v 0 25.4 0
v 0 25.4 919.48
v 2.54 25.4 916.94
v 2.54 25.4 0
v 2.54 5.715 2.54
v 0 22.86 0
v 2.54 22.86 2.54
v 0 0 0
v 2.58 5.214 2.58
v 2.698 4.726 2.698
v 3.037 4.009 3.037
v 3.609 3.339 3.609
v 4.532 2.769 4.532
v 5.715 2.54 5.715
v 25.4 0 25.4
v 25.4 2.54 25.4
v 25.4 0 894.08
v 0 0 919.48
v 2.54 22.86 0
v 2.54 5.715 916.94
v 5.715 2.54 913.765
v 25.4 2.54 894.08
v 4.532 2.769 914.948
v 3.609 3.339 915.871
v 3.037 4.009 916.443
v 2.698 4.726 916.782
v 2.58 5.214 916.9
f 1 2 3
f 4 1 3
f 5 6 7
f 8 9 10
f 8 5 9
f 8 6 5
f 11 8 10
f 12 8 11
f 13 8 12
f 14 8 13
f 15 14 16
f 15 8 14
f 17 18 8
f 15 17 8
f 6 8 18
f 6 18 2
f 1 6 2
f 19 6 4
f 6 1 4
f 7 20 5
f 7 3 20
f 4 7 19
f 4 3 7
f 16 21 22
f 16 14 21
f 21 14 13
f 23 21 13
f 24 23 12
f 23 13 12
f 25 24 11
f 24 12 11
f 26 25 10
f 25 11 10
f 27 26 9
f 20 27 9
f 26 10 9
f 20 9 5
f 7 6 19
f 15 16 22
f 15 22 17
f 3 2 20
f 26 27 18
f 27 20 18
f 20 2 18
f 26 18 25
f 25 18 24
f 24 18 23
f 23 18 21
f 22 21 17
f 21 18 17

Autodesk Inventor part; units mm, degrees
ref_plane "YZ Plane" through (0, 0, 0) normal (1, 0, 0) x (0, 1, 0)
ref_plane "XZ Plane" through (0, 0, 0) normal (0, 1, 0) x (-1, 0, 0)
ref_plane "XY Plane" through (0, 0, 0) normal (0, 0, 1) x (1, 0, 0)
sketch "Sketch1" plane through (0, 0, 0) normal (0, 0, 1) x (1, 0, 0)
  line L0 (0, 0) -> (0, 25.4)
  line L1 (0, 0) -> (25.4, 0)
  line L2 (2.54, 25.4) -> (2.54, 5.715)
  line L3 (5.715, 2.54) -> (25.4, 2.54)
  arc A0 (2.54, 5.715) -> (5.715, 2.54) centre (5.715, 5.715) ccw
  line L4 (0, 25.4) -> (2.54, 25.4)
  line L5 (25.4, 2.54) -> (25.4, 0)
  dimension "d0" = 25.4
  dimension "d1" = 25.4
  dimension "d2" = 2.54
  dimension "d3" = 3.175
extrude "Extrusion1" add sketch "Sketch1" along normal blind 919.48
sketch "Sketch2" plane through (0, 0, 0) normal (0, -1, 0) x (1, 0, 0)
  line L0 (25.4, 0) -> (0, 0) projected
  line L1 (25.4, 0) -> (25.4, 919.48) projected
  line L2 (0, 919.48) -> (25.4, 919.48) projected
  line L3 (0, 919.48) -> (25.4, 894.08)
  line L4 (0, 919.48) -> (60.2005, 919.48) construction
  line L5 (0, 0) -> (25.4, 25.4)
  line L6 (0, 0) -> (85.1364, 0) construction
  dimension "d6" = 45
  dimension "d7" = 45
extrude "Extrusion2" cut sketch "Sketch2" against normal blind 914.4
sketch "Sketch3" plane through (0, 25.4, 919.48) normal (0, 1, 0) x (1, 0, 0)
  line L0 (2.54, 916.94) -> (0, 919.48) projected
  line L1 (2.54, 916.94) -> (2.54, 2.54) projected
  line L2 (0, 919.48) -> (2.54, 919.48)
  line L3 (2.54, 916.94) -> (2.54, 919.48)
extrude "Extrusion3" add sketch "Sketch3" against normal blind 2.54
equation "\"d0\" = hubAngleWidth1"
equation "\"d1\" = hubAngleWidth2"
equation "\"d2\" = hubAngleThickness"
equation "\"d3\" = 1.25 * hubAngleThickness"
equation "\"d4\" = hubOuterDiam + 2 * hubAngleThickness"
equation "\"hubOuterDiam\" = 914.4"
equation "\"hubInnerDiam\" = 457.2"
equation "\"hubRingThickness\" = 1.524"
equation "\"hubAngleThickness\" = 2.54"
equation "\"hubAngleWidth1\" = 25.4"
equation "\"hubAngleWidth2\" = 25.4"
properties part number "hubRingJigOuter"
